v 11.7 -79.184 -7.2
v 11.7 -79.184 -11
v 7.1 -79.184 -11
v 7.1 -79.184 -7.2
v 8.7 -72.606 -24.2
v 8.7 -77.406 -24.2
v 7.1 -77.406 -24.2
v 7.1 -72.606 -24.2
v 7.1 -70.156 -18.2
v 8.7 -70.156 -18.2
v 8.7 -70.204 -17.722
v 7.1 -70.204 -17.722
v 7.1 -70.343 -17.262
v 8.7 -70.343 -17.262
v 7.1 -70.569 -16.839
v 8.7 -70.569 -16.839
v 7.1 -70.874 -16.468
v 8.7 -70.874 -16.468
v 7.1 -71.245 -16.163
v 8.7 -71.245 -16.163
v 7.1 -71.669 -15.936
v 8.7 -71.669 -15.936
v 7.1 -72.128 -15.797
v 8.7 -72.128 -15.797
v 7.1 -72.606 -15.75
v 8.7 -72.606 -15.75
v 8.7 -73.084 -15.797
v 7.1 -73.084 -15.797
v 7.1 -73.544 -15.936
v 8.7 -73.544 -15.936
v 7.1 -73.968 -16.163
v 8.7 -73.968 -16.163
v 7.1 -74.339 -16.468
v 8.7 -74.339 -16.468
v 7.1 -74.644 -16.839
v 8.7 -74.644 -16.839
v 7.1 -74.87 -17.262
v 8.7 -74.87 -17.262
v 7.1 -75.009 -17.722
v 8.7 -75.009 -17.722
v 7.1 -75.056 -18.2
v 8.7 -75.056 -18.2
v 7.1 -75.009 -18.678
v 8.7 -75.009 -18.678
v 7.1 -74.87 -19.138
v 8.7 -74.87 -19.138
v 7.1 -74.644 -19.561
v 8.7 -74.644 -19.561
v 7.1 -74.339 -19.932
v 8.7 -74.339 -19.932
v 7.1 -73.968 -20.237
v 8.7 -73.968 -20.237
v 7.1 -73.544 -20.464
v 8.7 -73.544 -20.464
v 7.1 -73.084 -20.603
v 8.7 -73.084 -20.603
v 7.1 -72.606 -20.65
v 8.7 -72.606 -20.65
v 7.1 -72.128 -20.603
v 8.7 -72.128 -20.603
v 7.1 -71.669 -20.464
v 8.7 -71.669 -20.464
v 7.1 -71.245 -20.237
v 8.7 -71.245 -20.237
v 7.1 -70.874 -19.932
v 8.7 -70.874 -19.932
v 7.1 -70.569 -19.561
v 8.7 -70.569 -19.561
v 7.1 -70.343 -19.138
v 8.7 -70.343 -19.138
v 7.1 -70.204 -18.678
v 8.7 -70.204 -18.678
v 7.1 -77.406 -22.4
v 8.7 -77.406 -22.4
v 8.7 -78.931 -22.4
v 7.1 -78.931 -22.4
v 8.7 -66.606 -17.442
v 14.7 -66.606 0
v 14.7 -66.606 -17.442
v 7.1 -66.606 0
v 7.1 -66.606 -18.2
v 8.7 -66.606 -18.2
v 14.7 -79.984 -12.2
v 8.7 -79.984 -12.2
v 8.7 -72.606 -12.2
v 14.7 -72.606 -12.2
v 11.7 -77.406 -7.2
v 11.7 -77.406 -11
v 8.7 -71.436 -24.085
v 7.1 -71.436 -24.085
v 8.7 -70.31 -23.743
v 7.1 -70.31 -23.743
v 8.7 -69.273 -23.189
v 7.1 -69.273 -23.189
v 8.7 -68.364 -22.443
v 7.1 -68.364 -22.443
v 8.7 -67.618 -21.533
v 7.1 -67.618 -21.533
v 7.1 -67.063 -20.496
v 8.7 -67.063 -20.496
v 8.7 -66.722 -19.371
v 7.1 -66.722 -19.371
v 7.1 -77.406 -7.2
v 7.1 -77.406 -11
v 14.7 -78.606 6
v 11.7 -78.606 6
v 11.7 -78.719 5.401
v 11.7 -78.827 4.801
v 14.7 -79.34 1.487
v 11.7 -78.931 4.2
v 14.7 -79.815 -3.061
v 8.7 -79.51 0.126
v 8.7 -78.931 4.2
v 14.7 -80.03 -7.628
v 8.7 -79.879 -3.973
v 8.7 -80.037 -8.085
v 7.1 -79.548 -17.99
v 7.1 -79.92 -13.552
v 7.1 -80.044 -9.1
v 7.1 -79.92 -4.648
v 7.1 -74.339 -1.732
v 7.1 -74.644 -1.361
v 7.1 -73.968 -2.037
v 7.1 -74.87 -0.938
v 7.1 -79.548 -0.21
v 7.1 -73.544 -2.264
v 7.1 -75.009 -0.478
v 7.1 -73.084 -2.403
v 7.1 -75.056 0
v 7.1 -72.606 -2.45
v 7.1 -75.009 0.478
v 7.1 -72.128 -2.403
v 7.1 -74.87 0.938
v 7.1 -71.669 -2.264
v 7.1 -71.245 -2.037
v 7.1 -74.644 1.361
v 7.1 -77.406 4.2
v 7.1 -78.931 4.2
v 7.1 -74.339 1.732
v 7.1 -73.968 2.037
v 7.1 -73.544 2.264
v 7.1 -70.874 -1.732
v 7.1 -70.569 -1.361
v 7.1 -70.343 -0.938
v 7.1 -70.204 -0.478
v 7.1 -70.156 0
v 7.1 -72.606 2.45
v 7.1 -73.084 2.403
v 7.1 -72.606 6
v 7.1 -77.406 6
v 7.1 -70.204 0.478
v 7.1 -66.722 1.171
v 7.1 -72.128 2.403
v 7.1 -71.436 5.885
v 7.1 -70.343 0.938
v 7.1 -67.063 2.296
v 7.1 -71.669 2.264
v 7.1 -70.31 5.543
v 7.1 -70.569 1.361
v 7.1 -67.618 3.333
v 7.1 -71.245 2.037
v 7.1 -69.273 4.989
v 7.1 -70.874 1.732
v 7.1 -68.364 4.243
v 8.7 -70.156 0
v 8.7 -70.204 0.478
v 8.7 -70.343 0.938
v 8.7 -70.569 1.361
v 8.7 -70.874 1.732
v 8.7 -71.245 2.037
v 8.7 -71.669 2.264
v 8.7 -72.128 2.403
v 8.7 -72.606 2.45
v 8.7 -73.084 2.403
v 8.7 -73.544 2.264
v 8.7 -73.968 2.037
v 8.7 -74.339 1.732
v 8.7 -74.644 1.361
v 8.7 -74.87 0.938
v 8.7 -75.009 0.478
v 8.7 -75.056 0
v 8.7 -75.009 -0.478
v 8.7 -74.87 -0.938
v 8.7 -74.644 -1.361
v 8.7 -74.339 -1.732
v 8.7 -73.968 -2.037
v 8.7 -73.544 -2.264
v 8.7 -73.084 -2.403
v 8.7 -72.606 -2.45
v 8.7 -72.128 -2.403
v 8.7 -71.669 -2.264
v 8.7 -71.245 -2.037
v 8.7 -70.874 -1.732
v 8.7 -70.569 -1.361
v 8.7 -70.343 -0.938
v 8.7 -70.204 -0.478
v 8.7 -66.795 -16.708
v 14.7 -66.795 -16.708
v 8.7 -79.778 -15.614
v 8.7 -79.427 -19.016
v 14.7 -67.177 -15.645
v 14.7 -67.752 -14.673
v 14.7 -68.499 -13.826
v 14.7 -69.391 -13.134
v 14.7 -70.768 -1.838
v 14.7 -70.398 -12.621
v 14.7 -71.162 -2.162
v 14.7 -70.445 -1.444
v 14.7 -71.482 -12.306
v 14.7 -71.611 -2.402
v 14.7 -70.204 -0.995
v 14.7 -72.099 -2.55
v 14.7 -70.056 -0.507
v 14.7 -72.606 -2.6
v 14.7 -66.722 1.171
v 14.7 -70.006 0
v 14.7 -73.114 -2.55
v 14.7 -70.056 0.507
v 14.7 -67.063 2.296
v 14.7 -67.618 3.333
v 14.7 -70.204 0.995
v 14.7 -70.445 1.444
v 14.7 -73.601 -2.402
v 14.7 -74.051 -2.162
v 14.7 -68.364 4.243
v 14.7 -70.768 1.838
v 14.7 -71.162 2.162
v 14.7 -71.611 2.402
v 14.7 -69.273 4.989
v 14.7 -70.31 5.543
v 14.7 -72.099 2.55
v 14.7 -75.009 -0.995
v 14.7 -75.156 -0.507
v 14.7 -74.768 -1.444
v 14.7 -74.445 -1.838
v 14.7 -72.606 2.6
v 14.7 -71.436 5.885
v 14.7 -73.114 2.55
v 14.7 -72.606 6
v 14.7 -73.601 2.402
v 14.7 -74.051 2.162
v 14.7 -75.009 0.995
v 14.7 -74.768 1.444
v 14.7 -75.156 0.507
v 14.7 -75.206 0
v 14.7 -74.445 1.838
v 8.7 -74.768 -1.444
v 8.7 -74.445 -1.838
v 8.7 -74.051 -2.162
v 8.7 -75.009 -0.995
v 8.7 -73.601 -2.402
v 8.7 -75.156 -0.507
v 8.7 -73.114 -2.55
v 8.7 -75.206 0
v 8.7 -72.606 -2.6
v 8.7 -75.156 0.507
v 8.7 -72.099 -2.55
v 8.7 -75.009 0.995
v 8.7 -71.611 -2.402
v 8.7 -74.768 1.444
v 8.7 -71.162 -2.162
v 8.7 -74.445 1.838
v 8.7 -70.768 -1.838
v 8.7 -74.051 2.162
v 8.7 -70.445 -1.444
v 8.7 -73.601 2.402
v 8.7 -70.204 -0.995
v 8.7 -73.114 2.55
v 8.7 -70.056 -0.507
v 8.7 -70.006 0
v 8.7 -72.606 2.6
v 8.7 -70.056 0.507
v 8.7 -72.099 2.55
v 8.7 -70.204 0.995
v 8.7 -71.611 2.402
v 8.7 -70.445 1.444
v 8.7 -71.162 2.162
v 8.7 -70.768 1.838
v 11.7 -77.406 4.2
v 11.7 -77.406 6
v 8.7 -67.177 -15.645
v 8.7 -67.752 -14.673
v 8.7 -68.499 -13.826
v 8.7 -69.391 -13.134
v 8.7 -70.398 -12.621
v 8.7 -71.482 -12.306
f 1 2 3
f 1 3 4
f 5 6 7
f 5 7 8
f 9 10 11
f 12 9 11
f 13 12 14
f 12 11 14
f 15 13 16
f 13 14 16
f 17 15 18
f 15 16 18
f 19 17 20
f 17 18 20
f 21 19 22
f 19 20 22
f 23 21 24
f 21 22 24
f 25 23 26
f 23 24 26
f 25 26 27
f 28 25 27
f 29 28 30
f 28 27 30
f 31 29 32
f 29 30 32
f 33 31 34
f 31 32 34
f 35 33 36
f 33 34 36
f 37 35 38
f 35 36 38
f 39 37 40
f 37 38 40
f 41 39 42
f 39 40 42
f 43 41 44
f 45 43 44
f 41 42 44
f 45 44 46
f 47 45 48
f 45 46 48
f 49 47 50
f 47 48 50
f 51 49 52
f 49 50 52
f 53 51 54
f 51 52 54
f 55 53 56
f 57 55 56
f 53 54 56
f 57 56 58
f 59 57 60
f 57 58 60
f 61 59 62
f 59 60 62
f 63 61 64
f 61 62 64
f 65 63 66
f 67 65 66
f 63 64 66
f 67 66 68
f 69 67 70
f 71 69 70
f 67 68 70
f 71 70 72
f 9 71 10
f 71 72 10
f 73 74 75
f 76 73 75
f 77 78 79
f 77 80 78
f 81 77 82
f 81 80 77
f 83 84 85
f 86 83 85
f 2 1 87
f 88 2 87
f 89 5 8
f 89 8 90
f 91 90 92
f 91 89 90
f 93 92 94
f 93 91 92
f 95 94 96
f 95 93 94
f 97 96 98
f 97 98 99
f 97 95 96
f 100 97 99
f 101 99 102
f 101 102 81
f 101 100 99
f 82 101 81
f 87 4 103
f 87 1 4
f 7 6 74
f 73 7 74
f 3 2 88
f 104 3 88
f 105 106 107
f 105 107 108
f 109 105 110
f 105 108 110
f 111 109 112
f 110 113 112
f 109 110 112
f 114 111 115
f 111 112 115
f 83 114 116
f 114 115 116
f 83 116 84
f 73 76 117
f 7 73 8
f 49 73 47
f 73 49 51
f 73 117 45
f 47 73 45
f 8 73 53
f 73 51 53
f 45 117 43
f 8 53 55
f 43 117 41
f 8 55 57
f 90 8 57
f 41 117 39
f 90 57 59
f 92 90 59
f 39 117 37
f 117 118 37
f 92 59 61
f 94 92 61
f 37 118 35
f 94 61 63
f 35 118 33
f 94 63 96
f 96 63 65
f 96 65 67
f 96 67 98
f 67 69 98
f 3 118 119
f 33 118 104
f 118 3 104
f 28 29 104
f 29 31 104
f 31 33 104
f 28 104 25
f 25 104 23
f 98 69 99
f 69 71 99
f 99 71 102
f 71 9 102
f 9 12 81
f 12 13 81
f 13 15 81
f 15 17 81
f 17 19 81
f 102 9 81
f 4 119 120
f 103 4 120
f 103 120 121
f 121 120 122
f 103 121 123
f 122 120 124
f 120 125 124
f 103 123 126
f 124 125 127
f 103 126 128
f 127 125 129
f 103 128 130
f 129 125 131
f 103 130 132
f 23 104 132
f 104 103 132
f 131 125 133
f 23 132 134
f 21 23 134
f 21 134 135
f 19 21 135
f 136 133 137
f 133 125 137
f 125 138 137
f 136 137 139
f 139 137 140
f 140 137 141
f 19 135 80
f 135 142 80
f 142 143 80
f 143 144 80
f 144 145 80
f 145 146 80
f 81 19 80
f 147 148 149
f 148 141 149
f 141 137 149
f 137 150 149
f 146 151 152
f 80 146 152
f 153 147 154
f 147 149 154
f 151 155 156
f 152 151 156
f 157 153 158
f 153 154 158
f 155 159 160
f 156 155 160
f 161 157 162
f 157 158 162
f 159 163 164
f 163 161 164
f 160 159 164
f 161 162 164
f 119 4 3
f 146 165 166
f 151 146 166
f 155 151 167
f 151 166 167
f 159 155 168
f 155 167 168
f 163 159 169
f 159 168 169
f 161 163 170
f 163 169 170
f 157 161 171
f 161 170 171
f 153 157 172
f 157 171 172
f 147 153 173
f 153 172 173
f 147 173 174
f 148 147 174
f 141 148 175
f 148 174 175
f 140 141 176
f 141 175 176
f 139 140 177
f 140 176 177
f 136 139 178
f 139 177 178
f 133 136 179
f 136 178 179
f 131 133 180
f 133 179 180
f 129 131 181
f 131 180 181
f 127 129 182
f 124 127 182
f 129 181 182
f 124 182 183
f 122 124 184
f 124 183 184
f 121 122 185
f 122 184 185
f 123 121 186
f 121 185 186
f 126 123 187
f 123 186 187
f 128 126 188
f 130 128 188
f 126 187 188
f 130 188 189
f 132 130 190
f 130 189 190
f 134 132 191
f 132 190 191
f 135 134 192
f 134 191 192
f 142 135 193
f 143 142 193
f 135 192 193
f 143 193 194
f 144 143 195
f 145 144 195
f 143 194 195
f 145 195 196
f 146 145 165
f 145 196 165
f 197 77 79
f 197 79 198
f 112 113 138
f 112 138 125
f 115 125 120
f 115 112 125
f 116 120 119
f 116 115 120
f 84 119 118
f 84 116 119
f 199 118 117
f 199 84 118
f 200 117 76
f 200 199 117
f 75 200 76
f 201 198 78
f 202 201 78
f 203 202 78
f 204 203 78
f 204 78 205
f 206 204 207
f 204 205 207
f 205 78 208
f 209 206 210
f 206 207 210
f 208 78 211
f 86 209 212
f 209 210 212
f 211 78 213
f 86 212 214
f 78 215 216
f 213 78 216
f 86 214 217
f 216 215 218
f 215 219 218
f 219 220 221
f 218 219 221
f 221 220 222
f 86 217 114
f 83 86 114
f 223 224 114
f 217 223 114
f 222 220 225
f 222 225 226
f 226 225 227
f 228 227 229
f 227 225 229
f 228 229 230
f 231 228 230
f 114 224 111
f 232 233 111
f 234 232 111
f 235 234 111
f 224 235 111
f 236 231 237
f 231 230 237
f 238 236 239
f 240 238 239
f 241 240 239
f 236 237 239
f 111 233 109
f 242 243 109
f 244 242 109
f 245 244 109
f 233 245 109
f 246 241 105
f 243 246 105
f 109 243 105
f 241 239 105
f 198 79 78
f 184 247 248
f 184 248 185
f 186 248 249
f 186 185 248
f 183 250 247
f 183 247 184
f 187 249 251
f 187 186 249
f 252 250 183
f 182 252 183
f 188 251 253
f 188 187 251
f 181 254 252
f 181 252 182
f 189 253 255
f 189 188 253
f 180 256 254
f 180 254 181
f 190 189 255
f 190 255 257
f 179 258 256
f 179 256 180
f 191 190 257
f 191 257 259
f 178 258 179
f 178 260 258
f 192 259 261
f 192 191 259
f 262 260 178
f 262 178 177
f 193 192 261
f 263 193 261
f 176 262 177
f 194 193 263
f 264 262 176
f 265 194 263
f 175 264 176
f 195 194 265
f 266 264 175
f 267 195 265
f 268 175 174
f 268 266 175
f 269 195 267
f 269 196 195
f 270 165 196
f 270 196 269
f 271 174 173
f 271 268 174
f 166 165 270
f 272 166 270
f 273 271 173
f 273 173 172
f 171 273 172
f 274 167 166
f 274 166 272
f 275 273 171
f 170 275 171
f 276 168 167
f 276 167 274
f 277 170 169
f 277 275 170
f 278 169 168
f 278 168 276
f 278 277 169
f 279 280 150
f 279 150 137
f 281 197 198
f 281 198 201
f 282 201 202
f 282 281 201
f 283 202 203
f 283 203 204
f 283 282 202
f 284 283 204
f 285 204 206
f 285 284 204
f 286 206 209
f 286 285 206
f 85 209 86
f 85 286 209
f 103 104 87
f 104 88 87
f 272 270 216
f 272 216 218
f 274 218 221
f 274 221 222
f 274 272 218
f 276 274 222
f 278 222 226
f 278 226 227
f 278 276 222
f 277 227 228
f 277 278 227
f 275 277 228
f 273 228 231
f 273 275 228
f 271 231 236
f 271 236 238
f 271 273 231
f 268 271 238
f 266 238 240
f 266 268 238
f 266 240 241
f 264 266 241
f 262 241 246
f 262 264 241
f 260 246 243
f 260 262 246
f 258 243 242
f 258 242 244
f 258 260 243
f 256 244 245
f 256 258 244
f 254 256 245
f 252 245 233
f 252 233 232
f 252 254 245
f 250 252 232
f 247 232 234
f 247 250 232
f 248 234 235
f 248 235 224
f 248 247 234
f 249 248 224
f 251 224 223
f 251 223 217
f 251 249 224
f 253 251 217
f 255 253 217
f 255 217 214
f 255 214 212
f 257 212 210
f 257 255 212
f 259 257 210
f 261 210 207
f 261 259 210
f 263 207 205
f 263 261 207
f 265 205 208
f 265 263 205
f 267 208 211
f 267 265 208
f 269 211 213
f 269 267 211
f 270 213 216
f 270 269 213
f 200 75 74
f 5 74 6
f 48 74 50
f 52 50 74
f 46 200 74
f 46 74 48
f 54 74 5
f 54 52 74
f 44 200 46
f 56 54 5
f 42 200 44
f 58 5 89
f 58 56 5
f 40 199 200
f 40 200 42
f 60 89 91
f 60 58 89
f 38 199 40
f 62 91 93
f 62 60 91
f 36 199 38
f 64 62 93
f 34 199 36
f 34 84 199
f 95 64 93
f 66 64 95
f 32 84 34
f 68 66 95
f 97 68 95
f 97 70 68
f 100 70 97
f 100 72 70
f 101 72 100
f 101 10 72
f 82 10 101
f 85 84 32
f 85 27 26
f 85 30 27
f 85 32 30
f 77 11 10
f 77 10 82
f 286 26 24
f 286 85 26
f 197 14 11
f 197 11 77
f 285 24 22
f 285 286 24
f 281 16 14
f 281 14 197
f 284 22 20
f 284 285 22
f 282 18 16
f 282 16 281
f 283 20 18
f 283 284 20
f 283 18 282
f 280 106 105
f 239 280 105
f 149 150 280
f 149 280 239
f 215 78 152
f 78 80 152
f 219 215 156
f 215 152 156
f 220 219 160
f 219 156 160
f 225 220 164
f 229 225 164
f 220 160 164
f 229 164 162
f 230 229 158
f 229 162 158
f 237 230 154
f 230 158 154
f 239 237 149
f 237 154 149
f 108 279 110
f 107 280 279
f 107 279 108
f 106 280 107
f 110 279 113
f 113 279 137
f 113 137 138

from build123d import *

# Parameters (mm, degrees)
SKETCH034_R          = 2.45
PAD017_DEPTH         = 1.6
SKETCH035_R          = 2.6
PAD018_DEPTH         = 6
SKETCH061_W          = 1.7771358599
SKETCH061_H          = 3.8
POCKET023_DEPTH      = 1.6
POCKET023_DEPTH_BACK = 3


with BuildPart() as part:
    # Sketch034 → Pad017 (new body)
    with BuildSketch(Plane.YZ.offset(8.7)):
        with BuildLine():
            ThreePointArc((-6, 6), (-7.4371881489, -9.1), (-6, -24.2))
            Line((-6, -24.2), (0, -24.2))
            ThreePointArc((0, -24.2), (4.2426406871, -22.4426406871), (6, -18.2))
            Line((6, 0), (6, -18.2))
            ThreePointArc((6, 0), (4.2426406871, 4.2426406871), (0, 6))
            Line((-6, 6), (0, 6))
        make_face()
        Circle(SKETCH034_R, mode=Mode.SUBTRACT)
        with Locations((0, -18.2)):
            Circle(SKETCH034_R, mode=Mode.SUBTRACT)
    extrude(amount=-PAD017_DEPTH)

    # Sketch035 → Pad018 (join)
    with BuildSketch(Plane.YZ.offset(8.7)):
        with BuildLine():
            ThreePointArc((5.8114989668, -16.707860677), (3.6774423219, -13.4590699257), (0, -12.2))
            Line((-7.3771358599, -12.2), (0, -12.2))
            ThreePointArc((-6, 6), (-7.2090239265, -3.0606187573), (-7.3771358599, -12.2))
            Line((-6, 6), (0, 6))
            ThreePointArc((6, 0), (4.2426406871, 4.2426406871), (0, 6))
            Line((6, 0), (6, -17.4420237293))
            Line((6, -17.4420237293), (5.8114989668, -16.707860677))
        make_face()
        Circle(SKETCH035_R, mode=Mode.SUBTRACT)
    extrude(amount=PAD018_DEPTH)

    # Sketch061 → Pocket023 (cut, two sides)
    with BuildSketch(Plane.YZ.offset(8.7)) as pocket023_sk:
        with BuildLine():
            ThreePointArc((-6.3244944235, -22.4), (-6.167388681, -23.3009268767), (-6, -24.2))
            Line((-6, -24.2), (-4.8, -24.2))
            Line((-4.8, -24.2), (-4.8, -22.4))
            Line((-4.8, -22.4), (-6.3244944235, -22.4))
        make_face()
        with Locations((-5.68856793, -9.1)):
            Rectangle(SKETCH061_W, SKETCH061_H)
        with BuildLine():
            Line((-6, 6), (-4.8, 6))
            Line((-4.8, 6), (-4.8, 4.2))
            Line((-4.8, 4.2), (-6.3244944235, 4.2))
            ThreePointArc((-6, 6), (-6.167388681, 5.1009268767), (-6.3244944235, 4.2))
        make_face()
    extrude(amount=-POCKET023_DEPTH, mode=Mode.SUBTRACT)
    extrude(pocket023_sk.sketch, amount=POCKET023_DEPTH_BACK, mode=Mode.SUBTRACT)


with BuildPart() as part_1:
    # Body016 placement: moved
    add(part.part.moved(Location((0, -72.6064407756, 0))))


solid = part_1.part
